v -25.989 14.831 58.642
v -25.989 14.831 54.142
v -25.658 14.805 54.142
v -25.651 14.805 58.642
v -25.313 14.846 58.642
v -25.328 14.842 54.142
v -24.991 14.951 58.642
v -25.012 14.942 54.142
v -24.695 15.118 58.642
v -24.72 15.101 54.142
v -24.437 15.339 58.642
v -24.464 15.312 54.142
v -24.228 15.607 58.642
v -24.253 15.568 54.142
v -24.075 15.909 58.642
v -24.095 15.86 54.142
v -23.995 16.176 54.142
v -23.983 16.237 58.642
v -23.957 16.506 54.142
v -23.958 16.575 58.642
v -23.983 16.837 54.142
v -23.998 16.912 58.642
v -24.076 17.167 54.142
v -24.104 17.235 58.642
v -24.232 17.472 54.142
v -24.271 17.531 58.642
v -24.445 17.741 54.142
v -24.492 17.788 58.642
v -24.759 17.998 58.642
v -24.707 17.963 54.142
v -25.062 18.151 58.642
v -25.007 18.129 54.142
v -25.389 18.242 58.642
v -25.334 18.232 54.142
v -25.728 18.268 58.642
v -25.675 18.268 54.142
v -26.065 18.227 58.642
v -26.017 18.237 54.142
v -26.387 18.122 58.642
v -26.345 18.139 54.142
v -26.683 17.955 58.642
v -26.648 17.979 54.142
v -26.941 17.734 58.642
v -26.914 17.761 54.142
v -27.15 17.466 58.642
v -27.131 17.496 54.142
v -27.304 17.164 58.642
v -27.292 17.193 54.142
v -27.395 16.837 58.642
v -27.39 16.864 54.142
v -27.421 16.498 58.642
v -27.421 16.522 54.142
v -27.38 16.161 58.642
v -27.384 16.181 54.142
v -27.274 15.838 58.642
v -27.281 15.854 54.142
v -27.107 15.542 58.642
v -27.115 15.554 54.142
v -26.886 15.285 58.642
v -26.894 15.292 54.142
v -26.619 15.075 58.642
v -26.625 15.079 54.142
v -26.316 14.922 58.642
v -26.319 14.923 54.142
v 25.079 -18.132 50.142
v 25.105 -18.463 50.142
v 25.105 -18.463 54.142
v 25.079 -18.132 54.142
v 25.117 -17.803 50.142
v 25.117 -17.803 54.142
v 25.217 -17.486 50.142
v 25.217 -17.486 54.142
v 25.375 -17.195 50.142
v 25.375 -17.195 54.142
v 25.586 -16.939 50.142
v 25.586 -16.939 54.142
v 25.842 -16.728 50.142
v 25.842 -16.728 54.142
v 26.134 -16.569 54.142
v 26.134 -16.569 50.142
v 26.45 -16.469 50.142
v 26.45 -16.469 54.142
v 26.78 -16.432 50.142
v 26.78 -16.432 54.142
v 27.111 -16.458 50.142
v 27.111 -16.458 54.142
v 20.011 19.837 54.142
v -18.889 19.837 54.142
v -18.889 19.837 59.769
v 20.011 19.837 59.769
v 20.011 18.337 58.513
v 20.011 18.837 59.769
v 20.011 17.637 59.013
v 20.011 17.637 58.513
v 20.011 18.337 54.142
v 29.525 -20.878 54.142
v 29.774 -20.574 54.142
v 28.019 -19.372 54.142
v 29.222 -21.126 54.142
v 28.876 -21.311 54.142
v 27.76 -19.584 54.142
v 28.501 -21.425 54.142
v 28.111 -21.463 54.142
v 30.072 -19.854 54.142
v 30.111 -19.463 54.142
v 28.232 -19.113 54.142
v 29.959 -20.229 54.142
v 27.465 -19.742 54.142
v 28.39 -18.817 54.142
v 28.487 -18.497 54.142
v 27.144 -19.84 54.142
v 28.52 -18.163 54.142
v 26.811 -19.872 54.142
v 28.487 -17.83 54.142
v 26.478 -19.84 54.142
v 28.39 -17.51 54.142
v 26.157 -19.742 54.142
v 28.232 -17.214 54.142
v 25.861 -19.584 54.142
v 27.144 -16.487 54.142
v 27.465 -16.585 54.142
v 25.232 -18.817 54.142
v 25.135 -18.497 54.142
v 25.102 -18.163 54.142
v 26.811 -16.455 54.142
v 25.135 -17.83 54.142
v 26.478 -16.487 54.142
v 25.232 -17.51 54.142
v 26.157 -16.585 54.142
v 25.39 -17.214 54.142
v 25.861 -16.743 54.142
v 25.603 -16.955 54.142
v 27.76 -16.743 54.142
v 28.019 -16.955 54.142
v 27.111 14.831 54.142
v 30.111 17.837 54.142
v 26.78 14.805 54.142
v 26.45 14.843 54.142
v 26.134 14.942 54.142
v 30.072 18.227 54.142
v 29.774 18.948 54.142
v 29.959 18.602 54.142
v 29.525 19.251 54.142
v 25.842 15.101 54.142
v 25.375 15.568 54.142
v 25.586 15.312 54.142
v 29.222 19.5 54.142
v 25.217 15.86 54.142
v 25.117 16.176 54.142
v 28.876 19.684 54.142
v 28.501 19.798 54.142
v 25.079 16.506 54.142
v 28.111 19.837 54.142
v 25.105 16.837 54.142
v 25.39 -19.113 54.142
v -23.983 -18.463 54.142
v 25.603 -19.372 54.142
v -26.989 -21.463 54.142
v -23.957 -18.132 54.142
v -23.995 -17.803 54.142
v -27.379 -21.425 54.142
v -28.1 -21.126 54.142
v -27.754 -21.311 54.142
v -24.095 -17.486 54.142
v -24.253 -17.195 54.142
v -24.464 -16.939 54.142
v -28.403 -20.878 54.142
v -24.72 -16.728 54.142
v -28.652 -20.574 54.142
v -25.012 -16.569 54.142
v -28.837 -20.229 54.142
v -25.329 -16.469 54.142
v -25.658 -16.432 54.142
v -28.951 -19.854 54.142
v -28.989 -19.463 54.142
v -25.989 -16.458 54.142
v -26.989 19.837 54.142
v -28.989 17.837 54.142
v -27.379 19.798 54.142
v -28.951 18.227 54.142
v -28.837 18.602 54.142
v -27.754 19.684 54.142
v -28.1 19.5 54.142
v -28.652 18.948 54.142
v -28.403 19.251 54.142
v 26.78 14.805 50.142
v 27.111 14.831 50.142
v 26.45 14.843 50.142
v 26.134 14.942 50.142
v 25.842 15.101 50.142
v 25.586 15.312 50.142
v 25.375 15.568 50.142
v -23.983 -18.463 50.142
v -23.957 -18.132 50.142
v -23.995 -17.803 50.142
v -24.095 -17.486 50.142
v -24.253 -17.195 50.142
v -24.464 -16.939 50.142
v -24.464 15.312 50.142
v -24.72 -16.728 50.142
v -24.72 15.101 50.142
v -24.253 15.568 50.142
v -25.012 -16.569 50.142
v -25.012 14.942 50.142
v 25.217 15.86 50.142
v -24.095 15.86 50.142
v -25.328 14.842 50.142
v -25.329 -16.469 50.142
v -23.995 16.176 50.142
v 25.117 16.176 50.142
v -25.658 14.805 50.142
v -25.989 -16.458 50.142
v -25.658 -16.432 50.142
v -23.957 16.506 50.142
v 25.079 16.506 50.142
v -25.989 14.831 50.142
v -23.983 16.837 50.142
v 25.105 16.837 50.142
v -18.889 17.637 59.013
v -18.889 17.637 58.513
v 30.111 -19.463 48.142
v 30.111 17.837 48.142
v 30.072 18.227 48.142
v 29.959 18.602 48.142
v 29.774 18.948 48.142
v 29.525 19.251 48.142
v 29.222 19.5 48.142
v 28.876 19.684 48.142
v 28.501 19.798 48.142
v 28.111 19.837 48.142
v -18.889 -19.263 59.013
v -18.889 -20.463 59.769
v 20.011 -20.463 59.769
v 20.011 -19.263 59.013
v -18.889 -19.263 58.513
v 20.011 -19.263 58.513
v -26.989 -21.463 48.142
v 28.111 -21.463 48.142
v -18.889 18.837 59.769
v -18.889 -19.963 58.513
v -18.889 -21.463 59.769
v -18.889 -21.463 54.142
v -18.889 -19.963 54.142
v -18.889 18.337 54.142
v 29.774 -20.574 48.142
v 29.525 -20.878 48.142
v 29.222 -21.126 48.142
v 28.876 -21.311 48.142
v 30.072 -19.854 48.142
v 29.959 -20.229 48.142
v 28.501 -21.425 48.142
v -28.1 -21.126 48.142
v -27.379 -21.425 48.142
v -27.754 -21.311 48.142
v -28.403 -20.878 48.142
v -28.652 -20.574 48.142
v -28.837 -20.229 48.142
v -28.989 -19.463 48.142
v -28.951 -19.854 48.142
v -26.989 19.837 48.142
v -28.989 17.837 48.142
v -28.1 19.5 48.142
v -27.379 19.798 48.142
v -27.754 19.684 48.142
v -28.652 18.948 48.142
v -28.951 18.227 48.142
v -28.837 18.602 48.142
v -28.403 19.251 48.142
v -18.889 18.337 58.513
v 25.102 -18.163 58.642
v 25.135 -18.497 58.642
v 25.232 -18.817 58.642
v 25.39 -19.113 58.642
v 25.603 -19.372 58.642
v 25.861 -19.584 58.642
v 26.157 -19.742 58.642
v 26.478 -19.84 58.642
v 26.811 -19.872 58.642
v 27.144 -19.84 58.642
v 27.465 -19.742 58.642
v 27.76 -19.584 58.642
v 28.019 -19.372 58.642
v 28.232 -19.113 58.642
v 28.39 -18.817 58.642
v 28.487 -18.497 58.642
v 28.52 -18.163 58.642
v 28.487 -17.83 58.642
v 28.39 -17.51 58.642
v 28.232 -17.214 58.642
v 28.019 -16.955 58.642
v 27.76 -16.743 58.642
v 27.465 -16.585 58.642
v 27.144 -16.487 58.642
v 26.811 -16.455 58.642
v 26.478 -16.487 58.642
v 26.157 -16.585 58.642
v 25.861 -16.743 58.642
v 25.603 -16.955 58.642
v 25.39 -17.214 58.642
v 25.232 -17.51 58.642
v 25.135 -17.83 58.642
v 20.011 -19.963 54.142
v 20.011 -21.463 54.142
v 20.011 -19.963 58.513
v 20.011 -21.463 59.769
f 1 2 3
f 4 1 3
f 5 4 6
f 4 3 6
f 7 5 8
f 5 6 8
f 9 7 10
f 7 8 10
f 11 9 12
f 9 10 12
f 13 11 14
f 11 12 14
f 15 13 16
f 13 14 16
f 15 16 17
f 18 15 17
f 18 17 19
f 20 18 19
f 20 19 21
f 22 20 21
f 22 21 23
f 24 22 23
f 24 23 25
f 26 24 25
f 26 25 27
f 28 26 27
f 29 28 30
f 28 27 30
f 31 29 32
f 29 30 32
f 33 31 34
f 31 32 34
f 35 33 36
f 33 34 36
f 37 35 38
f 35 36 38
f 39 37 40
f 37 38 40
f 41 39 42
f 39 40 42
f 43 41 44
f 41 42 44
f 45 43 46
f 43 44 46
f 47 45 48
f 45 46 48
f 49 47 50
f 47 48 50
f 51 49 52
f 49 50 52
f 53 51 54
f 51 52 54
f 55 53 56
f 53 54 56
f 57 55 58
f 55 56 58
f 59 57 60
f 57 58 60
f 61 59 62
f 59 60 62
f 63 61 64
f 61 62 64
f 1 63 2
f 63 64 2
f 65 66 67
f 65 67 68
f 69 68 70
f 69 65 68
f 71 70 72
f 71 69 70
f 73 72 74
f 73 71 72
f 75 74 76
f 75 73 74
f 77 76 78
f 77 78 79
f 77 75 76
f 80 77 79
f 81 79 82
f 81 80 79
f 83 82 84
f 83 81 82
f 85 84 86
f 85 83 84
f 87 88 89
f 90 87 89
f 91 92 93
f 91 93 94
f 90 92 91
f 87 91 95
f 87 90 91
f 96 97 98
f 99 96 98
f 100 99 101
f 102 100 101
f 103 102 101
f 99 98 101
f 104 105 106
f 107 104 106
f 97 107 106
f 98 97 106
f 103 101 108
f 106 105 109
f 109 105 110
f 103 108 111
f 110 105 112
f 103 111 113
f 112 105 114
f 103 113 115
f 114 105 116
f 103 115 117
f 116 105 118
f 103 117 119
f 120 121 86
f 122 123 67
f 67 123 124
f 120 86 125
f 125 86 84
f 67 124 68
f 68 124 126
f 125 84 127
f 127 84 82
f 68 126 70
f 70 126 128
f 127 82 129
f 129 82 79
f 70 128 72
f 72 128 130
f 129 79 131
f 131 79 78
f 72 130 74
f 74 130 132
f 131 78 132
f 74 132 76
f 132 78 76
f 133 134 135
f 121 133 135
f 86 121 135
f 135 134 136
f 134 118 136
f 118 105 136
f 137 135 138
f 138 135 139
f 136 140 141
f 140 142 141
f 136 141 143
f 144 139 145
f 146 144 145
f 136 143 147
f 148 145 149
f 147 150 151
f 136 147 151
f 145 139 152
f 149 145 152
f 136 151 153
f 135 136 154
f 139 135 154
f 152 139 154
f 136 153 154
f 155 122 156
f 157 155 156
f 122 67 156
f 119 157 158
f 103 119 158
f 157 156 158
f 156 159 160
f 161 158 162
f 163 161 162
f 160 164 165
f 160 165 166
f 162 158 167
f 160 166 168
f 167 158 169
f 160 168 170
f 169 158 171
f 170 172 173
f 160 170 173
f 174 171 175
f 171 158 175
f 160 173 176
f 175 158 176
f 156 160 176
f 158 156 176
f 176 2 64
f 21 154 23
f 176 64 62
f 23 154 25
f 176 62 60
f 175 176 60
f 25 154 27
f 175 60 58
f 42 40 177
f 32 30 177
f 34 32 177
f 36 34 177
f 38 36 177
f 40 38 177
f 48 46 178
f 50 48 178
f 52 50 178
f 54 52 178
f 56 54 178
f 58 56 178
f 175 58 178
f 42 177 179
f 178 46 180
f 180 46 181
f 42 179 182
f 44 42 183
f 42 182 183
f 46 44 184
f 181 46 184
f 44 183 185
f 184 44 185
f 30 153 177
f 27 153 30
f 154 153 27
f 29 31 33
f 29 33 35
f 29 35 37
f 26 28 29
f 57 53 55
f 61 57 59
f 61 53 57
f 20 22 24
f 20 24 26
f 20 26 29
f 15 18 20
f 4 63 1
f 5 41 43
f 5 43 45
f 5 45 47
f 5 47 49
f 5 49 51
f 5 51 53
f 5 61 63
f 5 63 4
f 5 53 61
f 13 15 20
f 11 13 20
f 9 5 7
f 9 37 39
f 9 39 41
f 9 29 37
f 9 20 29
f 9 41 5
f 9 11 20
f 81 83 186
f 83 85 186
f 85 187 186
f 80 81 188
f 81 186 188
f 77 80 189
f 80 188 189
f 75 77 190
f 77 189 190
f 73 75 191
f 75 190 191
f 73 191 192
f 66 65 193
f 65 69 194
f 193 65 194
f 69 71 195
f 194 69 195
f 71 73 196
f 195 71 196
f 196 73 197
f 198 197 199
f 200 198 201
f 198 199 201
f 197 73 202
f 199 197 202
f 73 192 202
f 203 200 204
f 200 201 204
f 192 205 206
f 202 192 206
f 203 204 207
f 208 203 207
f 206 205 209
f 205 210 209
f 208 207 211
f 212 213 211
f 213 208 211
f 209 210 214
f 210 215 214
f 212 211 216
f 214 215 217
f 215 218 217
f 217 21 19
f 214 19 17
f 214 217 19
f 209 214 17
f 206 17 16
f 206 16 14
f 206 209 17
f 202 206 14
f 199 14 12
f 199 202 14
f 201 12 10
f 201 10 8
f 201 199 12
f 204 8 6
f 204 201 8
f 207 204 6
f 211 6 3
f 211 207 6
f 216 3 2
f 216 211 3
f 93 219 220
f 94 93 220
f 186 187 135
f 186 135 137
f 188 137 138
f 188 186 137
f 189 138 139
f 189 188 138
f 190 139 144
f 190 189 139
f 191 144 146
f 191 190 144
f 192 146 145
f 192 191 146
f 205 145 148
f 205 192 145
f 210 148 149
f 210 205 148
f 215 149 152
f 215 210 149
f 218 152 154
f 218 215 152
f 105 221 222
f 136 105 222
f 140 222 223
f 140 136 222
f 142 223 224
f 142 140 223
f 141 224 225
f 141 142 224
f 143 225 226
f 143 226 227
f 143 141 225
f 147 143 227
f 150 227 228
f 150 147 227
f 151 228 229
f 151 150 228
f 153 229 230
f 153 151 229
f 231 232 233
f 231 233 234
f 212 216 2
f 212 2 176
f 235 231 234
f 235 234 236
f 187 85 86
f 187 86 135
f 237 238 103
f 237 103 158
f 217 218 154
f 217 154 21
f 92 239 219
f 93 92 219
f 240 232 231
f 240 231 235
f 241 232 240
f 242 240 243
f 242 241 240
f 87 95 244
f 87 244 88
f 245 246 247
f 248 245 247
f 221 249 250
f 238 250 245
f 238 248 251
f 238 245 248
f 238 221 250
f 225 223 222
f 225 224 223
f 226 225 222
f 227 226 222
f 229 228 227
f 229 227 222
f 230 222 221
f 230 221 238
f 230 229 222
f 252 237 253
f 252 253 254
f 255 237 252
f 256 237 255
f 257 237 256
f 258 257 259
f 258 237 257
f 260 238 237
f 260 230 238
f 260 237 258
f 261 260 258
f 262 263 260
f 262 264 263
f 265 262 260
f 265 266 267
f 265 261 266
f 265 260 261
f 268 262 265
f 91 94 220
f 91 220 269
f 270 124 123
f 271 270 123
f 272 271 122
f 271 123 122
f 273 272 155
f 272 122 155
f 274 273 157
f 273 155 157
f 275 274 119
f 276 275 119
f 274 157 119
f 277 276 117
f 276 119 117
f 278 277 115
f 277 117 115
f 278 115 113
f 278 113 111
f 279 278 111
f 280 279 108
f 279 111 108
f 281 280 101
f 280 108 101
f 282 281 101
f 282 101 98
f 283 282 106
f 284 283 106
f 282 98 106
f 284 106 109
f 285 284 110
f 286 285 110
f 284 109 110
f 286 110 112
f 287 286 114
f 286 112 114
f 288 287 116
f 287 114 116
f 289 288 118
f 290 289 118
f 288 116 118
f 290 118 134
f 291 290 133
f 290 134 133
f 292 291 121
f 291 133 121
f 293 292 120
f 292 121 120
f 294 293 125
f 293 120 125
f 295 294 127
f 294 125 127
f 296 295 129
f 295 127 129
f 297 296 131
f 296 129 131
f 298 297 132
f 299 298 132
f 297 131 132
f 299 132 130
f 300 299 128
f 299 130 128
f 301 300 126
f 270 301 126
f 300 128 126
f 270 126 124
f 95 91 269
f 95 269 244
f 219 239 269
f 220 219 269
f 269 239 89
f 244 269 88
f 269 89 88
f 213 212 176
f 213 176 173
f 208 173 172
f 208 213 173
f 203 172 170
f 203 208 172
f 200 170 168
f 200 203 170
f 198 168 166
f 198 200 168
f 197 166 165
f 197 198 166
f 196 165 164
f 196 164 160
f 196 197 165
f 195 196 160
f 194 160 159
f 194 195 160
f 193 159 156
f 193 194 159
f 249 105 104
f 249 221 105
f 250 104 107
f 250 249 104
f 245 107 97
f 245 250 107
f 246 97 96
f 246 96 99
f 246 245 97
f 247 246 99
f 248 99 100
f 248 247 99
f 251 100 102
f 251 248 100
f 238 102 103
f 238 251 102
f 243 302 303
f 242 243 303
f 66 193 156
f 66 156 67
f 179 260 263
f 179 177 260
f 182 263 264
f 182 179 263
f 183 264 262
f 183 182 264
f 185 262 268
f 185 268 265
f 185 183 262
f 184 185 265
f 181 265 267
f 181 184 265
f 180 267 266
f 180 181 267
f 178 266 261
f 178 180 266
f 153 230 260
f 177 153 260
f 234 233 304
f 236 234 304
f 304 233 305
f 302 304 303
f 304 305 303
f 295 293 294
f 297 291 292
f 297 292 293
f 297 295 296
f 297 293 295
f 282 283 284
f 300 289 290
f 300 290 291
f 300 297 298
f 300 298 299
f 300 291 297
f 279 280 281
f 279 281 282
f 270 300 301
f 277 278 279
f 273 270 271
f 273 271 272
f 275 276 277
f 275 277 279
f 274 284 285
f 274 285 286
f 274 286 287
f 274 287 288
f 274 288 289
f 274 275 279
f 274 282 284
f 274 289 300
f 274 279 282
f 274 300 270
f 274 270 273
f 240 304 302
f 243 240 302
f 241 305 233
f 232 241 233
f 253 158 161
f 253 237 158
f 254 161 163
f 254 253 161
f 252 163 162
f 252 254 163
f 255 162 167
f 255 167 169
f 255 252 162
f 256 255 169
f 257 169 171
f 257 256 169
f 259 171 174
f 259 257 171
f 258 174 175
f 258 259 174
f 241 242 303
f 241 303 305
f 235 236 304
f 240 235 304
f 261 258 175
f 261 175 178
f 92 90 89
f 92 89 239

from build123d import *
from build123d.topology import SkipClean

# Parameters (mm, degrees)
SZKIC1_W                    = 59.100010001
SZKIC1_H                    = 41.299998987
DODANIE_WYCI_GNI_CIE1_DEPTH = 6
SZKIC2_W                    = 59.100010001
SZKIC2_H                    = 41.299998987
DODANIE_WYCI_GNI_CIE2_DEPTH = 2
DODANIE_WYCI_GNI_CIE3_DEPTH = 49
WYTNIJ_WYCI_GNI_CIE2_DEPTH  = 10.1
SZKIC10_R                   = 1.708928953
SZKIC10_R_2                 = 1.732000006
DODANIE_WYCI_GNI_CIE4_DEPTH = 4.5
ZAOKR_GLENIE2_R             = 2


with BuildPart() as part:
    # Szkic1 → Dodanie-wyciągnięcie1 (new body)
    with BuildSketch(Plane(origin=(0, 0, 48.142497501), x_dir=(-1, 0, 0), z_dir=(0, 0, -1))):
        with Locations((-0.56091645, -0.813328838)):
            Rectangle(SZKIC1_W, SZKIC1_H)
        with BuildLine():
            ThreePointArc((-27.11092145, 14.830852979), (-25.586268211, 15.311972573), (-25.105290748, 16.836670655))
            Line((-25.105290748, 16.836670655), (23.983285891, 16.836670655))
            ThreePointArc((23.983285891, 16.836670655), (24.464316114, 15.311856195), (25.989088551, 14.830692784))
            Line((25.989088551, 14.830692784), (25.989088551, -16.45750804))
            ThreePointArc((25.989088551, -16.45750804), (24.464318208, -16.938605941), (23.983068356, -18.463328332))
            Line((23.983068356, -18.463328332), (-25.105072686, -18.463328332))
            ThreePointArc((-25.105072686, -18.463328332), (-25.586269943, -16.938721956), (-27.11092145, -16.457667715))
            Line((-27.11092145, -16.457667715), (-27.11092145, 14.830852979))
        make_face(mode=Mode.SUBTRACT)
    extrude(amount=-DODANIE_WYCI_GNI_CIE1_DEPTH)

    # Szkic2 → Dodanie-wyciągnięcie2 (add)
    with BuildSketch(Plane(origin=(0, 0, 48.142497501), x_dir=(-1, 0, 0), z_dir=(0, 0, -1))):
        with Locations((-0.56091645, -0.813328838)):
            Rectangle(SZKIC2_W, SZKIC2_H)
    extrude(amount=-DODANIE_WYCI_GNI_CIE2_DEPTH)

    # Szkic10 → Dodanie-wyciągnięcie4 (add)
    with SkipClean():  # the faces are left unmerged after this step: merging them gives an invalid solid
        with BuildSketch(Plane.XY.offset(54.142497501)):
            with Locations((26.81092145, -18.163488345)):
                Circle(SZKIC10_R)
            with Locations((-25.68907855, 16.536511655)):
                Circle(SZKIC10_R_2)
        extrude(amount=DODANIE_WYCI_GNI_CIE4_DEPTH)

    # Zaokrąglenie2
    zaokr_glenie2_edges = [part.edges().sort_by_distance(p)[0] for p in [
        (-28.989088551, 19.836670655, 51.142497501),
        (30.11092145, 19.836670655, 51.142497501),
        (30.11092145, -21.463328332, 51.142497501),
        (-28.989088551, -21.463328332, 51.142497501),
    ]]
    fillet(zaokr_glenie2_edges, radius=ZAOKR_GLENIE2_R)


with BuildPart() as body_2:
    # Szkic5 → Dodanie-wyciągnięcie3 (new body)
    with BuildSketch(Plane(origin=(30.11092145, 0, 0), x_dir=(0, 0, -1), z_dir=(1, 0, 0))):
        Polygon((-54.142497501, 19.836670655), (-59.768947352, 19.836670655), (-59.768947352, 18.836670655), (-59.012699001, 17.636670655), (-58.512699001, 17.636670655), (-58.512699001, 18.336670655), (-54.142497501, 18.336670655), align=None)
    extrude(amount=-DODANIE_WYCI_GNI_CIE3_DEPTH)

    # Szkic5<2> → Wytnij-wyciągnięcie2 (cut)
    with BuildSketch(Plane(origin=(30.11092145, 0, 0), x_dir=(0, 0, -1), z_dir=(1, 0, 0))):
        Polygon((-54.142497501, 19.836670655), (-59.768947352, 19.836670655), (-59.768947352, 18.836670655), (-59.012699001, 17.636670655), (-58.512699001, 17.636670655), (-58.512699001, 18.336670655), (-54.142497501, 18.336670655), align=None)
    extrude(amount=-WYTNIJ_WYCI_GNI_CIE2_DEPTH, mode=Mode.SUBTRACT)


with BuildPart() as body_3:
    # Lustro3: mirrored copy
    add(body_2.part.mirror(Plane(origin=(0, -0.813328839, 0), x_dir=(0, 0, 1), z_dir=(0, -1, 0))))


solid = Compound([part.part, body_2.part, body_3.part])
